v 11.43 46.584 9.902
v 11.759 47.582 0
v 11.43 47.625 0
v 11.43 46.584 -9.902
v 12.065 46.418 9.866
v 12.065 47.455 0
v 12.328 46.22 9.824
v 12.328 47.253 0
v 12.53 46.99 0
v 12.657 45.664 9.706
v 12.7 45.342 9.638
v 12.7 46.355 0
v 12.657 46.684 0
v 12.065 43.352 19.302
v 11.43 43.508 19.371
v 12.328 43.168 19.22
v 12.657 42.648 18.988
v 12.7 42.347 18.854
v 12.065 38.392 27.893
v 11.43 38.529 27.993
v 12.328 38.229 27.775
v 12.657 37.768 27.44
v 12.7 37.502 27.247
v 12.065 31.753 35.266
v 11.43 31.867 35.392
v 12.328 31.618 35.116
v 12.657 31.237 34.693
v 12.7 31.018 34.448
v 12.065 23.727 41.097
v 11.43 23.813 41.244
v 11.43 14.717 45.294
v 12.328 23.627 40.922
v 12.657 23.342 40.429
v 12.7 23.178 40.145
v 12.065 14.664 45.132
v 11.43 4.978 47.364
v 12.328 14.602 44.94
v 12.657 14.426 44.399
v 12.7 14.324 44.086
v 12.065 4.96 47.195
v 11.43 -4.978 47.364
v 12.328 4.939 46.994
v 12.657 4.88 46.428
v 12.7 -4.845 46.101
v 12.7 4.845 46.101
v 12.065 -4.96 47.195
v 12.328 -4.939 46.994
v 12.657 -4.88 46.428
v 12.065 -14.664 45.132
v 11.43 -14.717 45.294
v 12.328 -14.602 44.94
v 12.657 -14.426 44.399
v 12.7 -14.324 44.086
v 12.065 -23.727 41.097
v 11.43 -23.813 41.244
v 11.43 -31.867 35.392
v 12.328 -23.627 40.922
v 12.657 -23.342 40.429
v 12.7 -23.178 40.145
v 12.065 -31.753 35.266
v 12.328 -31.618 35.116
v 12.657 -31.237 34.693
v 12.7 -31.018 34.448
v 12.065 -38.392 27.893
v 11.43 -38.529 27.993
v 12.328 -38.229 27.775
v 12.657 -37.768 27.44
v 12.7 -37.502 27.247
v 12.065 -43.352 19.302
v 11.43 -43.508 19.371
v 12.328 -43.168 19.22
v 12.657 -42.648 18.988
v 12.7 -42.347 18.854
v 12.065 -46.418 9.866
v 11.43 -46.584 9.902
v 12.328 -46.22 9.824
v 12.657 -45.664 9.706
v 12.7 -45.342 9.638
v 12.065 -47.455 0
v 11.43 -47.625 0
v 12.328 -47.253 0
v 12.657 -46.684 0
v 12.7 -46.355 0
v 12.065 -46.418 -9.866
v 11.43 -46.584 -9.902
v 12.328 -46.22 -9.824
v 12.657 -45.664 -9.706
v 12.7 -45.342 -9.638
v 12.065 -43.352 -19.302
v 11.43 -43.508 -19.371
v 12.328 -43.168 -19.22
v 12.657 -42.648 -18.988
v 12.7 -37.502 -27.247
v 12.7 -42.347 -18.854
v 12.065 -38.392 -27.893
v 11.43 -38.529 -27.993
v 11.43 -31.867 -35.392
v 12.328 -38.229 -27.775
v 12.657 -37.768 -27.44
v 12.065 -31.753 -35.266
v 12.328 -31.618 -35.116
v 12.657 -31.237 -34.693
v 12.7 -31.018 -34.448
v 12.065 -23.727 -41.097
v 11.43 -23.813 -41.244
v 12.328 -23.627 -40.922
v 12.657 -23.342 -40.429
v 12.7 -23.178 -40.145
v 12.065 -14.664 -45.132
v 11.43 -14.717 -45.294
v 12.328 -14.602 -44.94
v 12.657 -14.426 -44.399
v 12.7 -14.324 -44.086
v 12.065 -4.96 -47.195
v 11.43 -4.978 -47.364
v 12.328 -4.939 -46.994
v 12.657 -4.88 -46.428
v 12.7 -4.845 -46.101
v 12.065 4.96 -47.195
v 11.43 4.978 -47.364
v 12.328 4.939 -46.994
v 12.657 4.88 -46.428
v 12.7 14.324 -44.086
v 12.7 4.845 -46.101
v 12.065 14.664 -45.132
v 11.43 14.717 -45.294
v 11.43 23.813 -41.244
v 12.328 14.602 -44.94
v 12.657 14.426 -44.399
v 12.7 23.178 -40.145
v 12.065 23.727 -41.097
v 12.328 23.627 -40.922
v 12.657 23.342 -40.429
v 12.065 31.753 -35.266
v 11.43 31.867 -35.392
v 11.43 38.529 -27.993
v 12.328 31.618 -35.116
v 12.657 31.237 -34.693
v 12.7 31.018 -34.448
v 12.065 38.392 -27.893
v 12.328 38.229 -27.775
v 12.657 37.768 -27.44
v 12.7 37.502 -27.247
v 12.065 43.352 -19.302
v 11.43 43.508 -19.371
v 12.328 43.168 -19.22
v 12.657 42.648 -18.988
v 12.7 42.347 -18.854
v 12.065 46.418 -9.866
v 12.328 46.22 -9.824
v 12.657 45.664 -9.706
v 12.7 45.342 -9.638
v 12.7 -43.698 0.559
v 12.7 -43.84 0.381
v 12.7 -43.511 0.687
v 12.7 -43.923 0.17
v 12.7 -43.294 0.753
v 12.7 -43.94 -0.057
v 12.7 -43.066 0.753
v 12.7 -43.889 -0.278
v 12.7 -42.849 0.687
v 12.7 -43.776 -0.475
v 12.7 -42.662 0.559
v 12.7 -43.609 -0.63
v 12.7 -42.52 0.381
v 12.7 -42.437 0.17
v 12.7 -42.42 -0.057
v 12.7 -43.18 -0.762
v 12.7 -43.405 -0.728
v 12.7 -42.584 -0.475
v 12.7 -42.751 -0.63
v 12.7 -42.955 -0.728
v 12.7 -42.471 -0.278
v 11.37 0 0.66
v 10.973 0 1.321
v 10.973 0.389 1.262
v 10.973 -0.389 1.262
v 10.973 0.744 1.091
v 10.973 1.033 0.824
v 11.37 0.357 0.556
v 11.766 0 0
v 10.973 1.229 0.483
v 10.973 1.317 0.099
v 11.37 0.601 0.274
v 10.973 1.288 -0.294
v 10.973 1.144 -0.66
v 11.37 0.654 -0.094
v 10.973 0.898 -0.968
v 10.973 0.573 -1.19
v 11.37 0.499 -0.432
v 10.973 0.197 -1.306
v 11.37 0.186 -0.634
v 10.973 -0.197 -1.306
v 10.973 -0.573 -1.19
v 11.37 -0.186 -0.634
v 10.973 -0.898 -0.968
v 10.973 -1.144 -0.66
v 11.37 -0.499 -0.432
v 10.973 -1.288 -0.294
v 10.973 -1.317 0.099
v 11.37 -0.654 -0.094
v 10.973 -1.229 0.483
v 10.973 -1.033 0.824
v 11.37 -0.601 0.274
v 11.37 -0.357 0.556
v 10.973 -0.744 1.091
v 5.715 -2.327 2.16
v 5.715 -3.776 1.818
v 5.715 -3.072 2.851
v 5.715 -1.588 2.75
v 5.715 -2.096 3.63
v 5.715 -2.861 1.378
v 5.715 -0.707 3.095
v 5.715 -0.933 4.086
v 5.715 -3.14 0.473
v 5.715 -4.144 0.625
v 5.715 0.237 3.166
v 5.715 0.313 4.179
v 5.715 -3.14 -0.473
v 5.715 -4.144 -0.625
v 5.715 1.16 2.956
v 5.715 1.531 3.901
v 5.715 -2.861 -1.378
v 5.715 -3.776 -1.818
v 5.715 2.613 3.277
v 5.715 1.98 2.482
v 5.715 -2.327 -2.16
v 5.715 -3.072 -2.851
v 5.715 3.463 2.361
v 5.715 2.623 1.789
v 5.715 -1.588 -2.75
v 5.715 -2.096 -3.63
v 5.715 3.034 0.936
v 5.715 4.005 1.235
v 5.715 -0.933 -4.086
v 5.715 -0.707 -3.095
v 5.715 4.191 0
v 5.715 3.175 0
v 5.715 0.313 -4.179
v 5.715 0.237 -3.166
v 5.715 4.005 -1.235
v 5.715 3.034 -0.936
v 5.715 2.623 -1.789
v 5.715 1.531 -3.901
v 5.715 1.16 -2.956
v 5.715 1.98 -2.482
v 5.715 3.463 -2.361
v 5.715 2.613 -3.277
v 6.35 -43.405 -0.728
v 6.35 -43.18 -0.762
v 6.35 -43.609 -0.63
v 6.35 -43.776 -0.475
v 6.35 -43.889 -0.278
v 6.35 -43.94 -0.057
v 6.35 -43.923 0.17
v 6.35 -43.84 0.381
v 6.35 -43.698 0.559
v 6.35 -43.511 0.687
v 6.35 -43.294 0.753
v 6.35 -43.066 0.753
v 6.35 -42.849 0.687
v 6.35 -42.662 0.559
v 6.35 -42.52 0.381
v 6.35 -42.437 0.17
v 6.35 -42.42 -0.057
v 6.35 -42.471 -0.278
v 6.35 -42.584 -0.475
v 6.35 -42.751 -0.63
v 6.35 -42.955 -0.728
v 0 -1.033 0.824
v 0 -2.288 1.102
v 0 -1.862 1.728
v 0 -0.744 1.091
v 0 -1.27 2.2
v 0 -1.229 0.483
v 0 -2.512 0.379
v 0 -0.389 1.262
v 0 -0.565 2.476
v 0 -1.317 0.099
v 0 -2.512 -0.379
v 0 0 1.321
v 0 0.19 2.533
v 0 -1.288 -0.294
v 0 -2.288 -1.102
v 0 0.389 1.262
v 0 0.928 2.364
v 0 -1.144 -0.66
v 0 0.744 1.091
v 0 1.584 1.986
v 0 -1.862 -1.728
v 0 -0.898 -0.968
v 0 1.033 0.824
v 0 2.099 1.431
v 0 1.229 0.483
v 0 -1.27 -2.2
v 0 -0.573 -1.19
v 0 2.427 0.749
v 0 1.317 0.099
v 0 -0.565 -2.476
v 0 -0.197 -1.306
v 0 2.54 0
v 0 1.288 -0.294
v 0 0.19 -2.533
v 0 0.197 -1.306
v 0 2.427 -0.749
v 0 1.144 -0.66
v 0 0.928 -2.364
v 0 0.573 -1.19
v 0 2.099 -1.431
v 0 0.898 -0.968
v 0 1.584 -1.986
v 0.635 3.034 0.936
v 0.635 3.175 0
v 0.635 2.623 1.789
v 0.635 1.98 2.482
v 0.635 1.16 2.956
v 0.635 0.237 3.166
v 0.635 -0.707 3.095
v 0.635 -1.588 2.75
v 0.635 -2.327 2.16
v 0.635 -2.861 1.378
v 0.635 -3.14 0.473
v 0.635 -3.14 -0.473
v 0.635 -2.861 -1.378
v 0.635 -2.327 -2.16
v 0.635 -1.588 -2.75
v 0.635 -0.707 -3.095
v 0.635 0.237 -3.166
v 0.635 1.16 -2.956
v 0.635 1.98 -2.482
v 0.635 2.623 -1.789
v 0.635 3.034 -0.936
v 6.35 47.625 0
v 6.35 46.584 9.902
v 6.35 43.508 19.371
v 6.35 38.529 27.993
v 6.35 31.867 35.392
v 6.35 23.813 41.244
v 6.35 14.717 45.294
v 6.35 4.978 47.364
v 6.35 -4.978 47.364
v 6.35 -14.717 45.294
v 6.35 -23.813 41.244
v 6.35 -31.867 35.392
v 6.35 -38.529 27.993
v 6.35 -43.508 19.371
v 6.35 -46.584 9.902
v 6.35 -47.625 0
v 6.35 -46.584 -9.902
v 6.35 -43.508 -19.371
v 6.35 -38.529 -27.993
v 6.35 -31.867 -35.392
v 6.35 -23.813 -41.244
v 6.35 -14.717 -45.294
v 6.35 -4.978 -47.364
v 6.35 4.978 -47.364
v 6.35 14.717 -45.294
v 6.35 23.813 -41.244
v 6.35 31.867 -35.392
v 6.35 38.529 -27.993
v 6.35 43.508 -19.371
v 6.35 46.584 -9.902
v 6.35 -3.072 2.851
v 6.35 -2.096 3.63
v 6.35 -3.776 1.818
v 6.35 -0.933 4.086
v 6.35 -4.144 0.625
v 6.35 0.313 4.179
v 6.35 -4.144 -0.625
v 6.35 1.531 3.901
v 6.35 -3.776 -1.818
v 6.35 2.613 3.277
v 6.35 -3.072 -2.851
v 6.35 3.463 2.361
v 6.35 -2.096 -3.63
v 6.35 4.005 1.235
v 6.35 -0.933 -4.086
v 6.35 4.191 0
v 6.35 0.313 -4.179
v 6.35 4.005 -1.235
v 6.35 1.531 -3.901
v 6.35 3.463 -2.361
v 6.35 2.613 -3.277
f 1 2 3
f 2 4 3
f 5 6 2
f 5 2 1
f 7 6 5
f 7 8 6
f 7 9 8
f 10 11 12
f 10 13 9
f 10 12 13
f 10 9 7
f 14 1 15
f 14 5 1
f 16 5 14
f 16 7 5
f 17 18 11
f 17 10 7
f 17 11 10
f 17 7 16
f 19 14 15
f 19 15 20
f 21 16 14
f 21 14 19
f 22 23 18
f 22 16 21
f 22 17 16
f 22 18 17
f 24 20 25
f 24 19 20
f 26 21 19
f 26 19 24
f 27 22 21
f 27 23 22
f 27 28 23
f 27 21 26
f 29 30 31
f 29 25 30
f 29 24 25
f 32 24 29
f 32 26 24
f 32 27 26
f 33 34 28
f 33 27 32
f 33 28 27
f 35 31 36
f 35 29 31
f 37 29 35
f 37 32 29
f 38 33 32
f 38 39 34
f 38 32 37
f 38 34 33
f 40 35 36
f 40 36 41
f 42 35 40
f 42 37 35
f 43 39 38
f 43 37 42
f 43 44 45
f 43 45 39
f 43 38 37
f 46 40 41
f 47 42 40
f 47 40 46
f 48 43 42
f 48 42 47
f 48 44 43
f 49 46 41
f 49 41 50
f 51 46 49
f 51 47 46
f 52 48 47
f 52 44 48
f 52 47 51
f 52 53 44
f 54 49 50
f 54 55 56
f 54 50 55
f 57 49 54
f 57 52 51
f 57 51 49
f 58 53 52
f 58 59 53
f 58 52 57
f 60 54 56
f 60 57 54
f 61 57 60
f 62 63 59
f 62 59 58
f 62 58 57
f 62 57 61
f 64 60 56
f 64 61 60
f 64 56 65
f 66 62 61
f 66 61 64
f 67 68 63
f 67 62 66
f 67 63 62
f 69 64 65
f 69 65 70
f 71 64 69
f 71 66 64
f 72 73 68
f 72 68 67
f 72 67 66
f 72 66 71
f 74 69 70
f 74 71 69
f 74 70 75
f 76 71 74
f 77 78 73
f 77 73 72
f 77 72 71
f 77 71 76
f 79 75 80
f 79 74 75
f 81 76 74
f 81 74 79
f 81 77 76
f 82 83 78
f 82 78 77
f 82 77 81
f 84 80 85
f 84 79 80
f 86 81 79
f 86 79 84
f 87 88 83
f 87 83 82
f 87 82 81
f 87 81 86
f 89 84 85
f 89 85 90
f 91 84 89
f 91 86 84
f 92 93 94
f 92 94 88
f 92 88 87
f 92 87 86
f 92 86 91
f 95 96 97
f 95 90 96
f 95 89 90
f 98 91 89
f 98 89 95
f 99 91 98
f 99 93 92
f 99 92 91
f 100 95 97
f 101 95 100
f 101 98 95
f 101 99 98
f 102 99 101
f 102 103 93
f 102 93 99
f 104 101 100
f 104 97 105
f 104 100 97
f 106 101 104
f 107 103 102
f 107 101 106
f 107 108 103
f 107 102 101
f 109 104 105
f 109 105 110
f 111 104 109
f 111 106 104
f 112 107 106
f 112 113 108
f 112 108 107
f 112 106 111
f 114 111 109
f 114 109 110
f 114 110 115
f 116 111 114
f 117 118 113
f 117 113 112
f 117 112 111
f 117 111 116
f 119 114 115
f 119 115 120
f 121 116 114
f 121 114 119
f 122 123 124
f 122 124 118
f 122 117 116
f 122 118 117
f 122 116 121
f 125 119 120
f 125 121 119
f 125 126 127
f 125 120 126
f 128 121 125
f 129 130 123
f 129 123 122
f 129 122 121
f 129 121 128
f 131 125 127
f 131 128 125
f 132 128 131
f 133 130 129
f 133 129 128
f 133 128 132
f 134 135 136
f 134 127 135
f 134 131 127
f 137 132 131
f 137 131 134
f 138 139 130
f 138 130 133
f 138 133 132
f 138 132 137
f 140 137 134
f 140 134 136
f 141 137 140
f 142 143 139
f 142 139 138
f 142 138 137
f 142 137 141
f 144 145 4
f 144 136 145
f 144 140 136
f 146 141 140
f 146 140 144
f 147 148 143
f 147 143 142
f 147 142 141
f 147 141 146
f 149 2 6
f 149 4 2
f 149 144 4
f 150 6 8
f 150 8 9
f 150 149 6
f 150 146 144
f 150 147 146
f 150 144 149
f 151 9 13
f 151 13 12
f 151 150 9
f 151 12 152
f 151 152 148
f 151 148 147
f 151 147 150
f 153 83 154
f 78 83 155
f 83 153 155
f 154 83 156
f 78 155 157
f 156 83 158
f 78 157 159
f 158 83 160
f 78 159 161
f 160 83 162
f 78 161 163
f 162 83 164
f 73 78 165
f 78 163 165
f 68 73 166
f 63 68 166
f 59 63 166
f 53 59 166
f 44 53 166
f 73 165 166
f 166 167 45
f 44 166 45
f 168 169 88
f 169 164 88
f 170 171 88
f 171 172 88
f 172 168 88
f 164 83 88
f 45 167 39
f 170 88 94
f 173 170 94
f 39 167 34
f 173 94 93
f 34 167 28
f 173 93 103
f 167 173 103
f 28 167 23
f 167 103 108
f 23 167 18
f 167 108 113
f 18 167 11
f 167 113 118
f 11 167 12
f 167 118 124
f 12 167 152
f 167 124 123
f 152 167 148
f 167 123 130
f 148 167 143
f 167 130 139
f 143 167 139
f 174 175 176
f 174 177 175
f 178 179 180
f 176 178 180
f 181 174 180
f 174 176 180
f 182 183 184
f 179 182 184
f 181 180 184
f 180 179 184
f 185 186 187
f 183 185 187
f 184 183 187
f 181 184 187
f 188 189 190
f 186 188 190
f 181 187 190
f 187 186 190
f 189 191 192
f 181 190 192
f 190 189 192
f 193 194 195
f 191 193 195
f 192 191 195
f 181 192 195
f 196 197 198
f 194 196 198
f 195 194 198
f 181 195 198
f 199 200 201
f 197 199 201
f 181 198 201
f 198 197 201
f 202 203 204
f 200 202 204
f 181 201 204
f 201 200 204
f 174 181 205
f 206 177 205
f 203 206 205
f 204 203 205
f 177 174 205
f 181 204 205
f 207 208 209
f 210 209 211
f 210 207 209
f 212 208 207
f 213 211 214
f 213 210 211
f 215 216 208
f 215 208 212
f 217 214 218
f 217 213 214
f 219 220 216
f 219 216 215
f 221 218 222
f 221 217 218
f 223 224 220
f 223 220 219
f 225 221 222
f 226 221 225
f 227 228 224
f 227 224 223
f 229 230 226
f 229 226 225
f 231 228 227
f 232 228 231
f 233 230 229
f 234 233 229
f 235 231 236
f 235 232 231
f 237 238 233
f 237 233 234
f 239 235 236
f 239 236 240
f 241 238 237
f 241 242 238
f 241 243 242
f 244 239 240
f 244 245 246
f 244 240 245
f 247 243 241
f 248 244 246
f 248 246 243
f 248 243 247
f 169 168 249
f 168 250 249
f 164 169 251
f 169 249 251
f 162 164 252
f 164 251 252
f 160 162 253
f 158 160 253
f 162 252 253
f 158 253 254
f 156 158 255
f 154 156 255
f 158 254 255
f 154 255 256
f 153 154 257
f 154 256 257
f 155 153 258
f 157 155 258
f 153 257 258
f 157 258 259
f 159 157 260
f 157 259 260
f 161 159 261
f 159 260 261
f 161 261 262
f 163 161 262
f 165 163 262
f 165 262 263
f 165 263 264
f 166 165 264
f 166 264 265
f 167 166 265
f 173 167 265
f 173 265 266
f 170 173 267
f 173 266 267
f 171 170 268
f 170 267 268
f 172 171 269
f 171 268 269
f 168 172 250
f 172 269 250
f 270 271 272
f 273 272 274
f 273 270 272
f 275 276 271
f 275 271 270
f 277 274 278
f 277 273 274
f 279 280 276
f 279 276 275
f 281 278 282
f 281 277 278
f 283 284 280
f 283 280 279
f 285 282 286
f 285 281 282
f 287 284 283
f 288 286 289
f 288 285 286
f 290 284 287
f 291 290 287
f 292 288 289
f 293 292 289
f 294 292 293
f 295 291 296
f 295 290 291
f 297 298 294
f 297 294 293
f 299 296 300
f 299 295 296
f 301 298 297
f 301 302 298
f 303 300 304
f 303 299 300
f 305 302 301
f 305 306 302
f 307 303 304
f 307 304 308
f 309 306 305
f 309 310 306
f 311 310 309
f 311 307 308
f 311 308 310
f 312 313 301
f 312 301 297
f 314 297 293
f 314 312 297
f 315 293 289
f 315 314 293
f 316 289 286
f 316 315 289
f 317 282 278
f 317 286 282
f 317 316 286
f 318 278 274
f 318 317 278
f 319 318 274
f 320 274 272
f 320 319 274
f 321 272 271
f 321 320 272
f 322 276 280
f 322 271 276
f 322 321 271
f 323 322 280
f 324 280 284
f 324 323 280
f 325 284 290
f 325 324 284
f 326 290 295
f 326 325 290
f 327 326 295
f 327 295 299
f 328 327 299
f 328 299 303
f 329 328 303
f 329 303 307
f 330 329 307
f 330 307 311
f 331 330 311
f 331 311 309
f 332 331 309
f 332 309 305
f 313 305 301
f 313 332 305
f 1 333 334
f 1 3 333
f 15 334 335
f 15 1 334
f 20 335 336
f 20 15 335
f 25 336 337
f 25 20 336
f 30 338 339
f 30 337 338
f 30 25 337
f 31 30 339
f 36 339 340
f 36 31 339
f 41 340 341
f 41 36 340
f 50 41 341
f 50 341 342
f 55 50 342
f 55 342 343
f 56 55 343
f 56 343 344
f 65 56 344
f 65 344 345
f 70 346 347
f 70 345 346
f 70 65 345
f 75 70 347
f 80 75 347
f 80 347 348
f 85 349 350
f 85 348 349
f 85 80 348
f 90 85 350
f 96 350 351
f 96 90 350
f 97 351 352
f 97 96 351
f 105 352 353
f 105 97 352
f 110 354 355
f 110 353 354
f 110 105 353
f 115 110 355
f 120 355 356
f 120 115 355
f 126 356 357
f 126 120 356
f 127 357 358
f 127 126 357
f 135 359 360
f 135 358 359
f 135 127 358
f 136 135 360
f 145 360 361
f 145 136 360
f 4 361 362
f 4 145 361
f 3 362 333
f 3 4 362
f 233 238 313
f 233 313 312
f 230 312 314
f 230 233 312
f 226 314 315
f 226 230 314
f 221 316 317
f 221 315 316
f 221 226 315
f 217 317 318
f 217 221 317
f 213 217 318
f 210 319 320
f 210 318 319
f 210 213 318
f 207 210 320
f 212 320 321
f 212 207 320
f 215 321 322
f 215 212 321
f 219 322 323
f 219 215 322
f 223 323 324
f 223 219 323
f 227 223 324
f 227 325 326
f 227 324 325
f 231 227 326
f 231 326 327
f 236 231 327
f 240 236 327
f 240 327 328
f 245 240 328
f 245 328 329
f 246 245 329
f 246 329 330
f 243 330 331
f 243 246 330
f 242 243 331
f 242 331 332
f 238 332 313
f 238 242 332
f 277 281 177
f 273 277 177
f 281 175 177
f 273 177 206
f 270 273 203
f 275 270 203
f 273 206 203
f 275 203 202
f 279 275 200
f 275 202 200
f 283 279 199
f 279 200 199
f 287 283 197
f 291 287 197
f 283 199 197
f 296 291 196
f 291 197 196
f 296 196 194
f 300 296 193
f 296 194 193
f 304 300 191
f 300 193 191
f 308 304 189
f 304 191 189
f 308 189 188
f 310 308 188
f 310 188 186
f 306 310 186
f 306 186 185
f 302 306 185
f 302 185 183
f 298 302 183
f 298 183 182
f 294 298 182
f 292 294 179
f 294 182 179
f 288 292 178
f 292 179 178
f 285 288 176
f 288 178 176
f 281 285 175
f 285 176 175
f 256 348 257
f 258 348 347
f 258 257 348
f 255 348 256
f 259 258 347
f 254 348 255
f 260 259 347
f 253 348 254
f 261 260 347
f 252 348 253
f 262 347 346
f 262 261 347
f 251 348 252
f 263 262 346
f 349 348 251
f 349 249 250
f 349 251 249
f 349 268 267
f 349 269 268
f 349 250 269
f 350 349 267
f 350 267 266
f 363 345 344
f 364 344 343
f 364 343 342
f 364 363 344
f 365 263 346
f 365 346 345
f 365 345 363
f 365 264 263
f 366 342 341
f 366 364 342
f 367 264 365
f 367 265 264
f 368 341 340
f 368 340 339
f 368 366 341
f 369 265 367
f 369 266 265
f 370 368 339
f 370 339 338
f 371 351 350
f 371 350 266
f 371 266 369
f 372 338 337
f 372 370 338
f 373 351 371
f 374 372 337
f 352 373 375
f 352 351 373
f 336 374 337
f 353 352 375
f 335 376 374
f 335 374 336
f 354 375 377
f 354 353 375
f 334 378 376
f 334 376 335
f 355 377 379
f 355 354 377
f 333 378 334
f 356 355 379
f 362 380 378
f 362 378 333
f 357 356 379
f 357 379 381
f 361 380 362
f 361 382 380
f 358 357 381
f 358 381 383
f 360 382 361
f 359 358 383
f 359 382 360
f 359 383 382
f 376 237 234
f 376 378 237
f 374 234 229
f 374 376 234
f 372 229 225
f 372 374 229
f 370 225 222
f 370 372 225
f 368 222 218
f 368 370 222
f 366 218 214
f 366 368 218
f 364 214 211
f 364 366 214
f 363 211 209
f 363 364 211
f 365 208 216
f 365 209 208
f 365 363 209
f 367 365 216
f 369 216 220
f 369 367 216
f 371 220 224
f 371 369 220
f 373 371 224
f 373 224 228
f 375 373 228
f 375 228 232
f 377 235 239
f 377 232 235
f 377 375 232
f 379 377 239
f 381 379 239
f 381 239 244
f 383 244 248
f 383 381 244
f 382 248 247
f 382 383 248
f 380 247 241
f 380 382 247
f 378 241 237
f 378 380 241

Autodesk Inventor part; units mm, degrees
ref_plane "YZ Plane" through (0, 0, 0) normal (1, 0, 0) x (0, 1, 0)
ref_plane "XZ Plane" through (0, 0, 0) normal (0, 1, 0) x (-1, 0, 0)
ref_plane "XY Plane" through (0, 0, 0) normal (0, 0, 1) x (1, 0, 0)
sketch "Sketch5" plane through (0, 0, 0) normal (0, 0, 1) x (1, 0, 0)
  line L0 (0, 0) -> (0, 3.175)
  line L1 (0, 3.175) -> (5.715, 3.175)
  line L2 (6.35, 4.191) -> (6.35, 47.625)
  line L3 (6.35, 47.625) -> (12.7, 47.625)
  line L4 (12.7, 47.625) -> (12.7, 0)
  line L5 (12.7, 0) -> (0, 0)
  line L6 (5.715, 3.175) -> (5.715, 4.191)
  line L7 (5.715, 4.191) -> (6.35, 4.191)
  point P0 (9.525, 3.175)
  dimension "d9" = 3.175
  dimension "d10" = 47.625
  dimension "d14" = 6.35
  dimension "d18" = 0.635
  dimension "d19" = 4.191
  dimension "d21" = 5.715
revolve "Revolution1" add sketch "Sketch5" angle 360 about axis through (12.7, 0, 0) along (-1, 0, 0)
fillet "Fillet1" radius 1.27 1 edges at (12.7, -47.625, 0)
chamfer "Chamfer1" distance 0.635 angle 45 1 edges at (0, -3.175, 0)
sketch "Sketch6" plane through (12.7, 0, 0) normal (1, 0, 0) x (0, 0, -1)
  circle A0 centre (0, 0) radius 46.355 projected
  line L0 (-34.925, -19.05) -> (34.925, -19.05)
  line L1 (0, 0) -> (0, -19.05)
  point P0 (0, -43.18)
  dimension "d27" = 43.18
  dimension "d43" = 69.85
  dimension "d44" = 19.05
hole "Hole1" at (12.7, -43.18, 0) direction (-1, 0, 0) diameter 1.524 end through all
sketch "Sketch7" plane through (0, 0, 0) normal (-1, 0, 0) x (0, 0, 1)
  point P0 (0, 0)
hole "Hole2" at (0, 0, 0) direction (1, 0, 0) diameter 2.6416 depth 10.9728 tip angle 118 thread size "6-32 UNC" class "2B" standard "ANSI Unified Screw Threads"
properties part number "wheel hubcap" material "Aluminum 6061"
